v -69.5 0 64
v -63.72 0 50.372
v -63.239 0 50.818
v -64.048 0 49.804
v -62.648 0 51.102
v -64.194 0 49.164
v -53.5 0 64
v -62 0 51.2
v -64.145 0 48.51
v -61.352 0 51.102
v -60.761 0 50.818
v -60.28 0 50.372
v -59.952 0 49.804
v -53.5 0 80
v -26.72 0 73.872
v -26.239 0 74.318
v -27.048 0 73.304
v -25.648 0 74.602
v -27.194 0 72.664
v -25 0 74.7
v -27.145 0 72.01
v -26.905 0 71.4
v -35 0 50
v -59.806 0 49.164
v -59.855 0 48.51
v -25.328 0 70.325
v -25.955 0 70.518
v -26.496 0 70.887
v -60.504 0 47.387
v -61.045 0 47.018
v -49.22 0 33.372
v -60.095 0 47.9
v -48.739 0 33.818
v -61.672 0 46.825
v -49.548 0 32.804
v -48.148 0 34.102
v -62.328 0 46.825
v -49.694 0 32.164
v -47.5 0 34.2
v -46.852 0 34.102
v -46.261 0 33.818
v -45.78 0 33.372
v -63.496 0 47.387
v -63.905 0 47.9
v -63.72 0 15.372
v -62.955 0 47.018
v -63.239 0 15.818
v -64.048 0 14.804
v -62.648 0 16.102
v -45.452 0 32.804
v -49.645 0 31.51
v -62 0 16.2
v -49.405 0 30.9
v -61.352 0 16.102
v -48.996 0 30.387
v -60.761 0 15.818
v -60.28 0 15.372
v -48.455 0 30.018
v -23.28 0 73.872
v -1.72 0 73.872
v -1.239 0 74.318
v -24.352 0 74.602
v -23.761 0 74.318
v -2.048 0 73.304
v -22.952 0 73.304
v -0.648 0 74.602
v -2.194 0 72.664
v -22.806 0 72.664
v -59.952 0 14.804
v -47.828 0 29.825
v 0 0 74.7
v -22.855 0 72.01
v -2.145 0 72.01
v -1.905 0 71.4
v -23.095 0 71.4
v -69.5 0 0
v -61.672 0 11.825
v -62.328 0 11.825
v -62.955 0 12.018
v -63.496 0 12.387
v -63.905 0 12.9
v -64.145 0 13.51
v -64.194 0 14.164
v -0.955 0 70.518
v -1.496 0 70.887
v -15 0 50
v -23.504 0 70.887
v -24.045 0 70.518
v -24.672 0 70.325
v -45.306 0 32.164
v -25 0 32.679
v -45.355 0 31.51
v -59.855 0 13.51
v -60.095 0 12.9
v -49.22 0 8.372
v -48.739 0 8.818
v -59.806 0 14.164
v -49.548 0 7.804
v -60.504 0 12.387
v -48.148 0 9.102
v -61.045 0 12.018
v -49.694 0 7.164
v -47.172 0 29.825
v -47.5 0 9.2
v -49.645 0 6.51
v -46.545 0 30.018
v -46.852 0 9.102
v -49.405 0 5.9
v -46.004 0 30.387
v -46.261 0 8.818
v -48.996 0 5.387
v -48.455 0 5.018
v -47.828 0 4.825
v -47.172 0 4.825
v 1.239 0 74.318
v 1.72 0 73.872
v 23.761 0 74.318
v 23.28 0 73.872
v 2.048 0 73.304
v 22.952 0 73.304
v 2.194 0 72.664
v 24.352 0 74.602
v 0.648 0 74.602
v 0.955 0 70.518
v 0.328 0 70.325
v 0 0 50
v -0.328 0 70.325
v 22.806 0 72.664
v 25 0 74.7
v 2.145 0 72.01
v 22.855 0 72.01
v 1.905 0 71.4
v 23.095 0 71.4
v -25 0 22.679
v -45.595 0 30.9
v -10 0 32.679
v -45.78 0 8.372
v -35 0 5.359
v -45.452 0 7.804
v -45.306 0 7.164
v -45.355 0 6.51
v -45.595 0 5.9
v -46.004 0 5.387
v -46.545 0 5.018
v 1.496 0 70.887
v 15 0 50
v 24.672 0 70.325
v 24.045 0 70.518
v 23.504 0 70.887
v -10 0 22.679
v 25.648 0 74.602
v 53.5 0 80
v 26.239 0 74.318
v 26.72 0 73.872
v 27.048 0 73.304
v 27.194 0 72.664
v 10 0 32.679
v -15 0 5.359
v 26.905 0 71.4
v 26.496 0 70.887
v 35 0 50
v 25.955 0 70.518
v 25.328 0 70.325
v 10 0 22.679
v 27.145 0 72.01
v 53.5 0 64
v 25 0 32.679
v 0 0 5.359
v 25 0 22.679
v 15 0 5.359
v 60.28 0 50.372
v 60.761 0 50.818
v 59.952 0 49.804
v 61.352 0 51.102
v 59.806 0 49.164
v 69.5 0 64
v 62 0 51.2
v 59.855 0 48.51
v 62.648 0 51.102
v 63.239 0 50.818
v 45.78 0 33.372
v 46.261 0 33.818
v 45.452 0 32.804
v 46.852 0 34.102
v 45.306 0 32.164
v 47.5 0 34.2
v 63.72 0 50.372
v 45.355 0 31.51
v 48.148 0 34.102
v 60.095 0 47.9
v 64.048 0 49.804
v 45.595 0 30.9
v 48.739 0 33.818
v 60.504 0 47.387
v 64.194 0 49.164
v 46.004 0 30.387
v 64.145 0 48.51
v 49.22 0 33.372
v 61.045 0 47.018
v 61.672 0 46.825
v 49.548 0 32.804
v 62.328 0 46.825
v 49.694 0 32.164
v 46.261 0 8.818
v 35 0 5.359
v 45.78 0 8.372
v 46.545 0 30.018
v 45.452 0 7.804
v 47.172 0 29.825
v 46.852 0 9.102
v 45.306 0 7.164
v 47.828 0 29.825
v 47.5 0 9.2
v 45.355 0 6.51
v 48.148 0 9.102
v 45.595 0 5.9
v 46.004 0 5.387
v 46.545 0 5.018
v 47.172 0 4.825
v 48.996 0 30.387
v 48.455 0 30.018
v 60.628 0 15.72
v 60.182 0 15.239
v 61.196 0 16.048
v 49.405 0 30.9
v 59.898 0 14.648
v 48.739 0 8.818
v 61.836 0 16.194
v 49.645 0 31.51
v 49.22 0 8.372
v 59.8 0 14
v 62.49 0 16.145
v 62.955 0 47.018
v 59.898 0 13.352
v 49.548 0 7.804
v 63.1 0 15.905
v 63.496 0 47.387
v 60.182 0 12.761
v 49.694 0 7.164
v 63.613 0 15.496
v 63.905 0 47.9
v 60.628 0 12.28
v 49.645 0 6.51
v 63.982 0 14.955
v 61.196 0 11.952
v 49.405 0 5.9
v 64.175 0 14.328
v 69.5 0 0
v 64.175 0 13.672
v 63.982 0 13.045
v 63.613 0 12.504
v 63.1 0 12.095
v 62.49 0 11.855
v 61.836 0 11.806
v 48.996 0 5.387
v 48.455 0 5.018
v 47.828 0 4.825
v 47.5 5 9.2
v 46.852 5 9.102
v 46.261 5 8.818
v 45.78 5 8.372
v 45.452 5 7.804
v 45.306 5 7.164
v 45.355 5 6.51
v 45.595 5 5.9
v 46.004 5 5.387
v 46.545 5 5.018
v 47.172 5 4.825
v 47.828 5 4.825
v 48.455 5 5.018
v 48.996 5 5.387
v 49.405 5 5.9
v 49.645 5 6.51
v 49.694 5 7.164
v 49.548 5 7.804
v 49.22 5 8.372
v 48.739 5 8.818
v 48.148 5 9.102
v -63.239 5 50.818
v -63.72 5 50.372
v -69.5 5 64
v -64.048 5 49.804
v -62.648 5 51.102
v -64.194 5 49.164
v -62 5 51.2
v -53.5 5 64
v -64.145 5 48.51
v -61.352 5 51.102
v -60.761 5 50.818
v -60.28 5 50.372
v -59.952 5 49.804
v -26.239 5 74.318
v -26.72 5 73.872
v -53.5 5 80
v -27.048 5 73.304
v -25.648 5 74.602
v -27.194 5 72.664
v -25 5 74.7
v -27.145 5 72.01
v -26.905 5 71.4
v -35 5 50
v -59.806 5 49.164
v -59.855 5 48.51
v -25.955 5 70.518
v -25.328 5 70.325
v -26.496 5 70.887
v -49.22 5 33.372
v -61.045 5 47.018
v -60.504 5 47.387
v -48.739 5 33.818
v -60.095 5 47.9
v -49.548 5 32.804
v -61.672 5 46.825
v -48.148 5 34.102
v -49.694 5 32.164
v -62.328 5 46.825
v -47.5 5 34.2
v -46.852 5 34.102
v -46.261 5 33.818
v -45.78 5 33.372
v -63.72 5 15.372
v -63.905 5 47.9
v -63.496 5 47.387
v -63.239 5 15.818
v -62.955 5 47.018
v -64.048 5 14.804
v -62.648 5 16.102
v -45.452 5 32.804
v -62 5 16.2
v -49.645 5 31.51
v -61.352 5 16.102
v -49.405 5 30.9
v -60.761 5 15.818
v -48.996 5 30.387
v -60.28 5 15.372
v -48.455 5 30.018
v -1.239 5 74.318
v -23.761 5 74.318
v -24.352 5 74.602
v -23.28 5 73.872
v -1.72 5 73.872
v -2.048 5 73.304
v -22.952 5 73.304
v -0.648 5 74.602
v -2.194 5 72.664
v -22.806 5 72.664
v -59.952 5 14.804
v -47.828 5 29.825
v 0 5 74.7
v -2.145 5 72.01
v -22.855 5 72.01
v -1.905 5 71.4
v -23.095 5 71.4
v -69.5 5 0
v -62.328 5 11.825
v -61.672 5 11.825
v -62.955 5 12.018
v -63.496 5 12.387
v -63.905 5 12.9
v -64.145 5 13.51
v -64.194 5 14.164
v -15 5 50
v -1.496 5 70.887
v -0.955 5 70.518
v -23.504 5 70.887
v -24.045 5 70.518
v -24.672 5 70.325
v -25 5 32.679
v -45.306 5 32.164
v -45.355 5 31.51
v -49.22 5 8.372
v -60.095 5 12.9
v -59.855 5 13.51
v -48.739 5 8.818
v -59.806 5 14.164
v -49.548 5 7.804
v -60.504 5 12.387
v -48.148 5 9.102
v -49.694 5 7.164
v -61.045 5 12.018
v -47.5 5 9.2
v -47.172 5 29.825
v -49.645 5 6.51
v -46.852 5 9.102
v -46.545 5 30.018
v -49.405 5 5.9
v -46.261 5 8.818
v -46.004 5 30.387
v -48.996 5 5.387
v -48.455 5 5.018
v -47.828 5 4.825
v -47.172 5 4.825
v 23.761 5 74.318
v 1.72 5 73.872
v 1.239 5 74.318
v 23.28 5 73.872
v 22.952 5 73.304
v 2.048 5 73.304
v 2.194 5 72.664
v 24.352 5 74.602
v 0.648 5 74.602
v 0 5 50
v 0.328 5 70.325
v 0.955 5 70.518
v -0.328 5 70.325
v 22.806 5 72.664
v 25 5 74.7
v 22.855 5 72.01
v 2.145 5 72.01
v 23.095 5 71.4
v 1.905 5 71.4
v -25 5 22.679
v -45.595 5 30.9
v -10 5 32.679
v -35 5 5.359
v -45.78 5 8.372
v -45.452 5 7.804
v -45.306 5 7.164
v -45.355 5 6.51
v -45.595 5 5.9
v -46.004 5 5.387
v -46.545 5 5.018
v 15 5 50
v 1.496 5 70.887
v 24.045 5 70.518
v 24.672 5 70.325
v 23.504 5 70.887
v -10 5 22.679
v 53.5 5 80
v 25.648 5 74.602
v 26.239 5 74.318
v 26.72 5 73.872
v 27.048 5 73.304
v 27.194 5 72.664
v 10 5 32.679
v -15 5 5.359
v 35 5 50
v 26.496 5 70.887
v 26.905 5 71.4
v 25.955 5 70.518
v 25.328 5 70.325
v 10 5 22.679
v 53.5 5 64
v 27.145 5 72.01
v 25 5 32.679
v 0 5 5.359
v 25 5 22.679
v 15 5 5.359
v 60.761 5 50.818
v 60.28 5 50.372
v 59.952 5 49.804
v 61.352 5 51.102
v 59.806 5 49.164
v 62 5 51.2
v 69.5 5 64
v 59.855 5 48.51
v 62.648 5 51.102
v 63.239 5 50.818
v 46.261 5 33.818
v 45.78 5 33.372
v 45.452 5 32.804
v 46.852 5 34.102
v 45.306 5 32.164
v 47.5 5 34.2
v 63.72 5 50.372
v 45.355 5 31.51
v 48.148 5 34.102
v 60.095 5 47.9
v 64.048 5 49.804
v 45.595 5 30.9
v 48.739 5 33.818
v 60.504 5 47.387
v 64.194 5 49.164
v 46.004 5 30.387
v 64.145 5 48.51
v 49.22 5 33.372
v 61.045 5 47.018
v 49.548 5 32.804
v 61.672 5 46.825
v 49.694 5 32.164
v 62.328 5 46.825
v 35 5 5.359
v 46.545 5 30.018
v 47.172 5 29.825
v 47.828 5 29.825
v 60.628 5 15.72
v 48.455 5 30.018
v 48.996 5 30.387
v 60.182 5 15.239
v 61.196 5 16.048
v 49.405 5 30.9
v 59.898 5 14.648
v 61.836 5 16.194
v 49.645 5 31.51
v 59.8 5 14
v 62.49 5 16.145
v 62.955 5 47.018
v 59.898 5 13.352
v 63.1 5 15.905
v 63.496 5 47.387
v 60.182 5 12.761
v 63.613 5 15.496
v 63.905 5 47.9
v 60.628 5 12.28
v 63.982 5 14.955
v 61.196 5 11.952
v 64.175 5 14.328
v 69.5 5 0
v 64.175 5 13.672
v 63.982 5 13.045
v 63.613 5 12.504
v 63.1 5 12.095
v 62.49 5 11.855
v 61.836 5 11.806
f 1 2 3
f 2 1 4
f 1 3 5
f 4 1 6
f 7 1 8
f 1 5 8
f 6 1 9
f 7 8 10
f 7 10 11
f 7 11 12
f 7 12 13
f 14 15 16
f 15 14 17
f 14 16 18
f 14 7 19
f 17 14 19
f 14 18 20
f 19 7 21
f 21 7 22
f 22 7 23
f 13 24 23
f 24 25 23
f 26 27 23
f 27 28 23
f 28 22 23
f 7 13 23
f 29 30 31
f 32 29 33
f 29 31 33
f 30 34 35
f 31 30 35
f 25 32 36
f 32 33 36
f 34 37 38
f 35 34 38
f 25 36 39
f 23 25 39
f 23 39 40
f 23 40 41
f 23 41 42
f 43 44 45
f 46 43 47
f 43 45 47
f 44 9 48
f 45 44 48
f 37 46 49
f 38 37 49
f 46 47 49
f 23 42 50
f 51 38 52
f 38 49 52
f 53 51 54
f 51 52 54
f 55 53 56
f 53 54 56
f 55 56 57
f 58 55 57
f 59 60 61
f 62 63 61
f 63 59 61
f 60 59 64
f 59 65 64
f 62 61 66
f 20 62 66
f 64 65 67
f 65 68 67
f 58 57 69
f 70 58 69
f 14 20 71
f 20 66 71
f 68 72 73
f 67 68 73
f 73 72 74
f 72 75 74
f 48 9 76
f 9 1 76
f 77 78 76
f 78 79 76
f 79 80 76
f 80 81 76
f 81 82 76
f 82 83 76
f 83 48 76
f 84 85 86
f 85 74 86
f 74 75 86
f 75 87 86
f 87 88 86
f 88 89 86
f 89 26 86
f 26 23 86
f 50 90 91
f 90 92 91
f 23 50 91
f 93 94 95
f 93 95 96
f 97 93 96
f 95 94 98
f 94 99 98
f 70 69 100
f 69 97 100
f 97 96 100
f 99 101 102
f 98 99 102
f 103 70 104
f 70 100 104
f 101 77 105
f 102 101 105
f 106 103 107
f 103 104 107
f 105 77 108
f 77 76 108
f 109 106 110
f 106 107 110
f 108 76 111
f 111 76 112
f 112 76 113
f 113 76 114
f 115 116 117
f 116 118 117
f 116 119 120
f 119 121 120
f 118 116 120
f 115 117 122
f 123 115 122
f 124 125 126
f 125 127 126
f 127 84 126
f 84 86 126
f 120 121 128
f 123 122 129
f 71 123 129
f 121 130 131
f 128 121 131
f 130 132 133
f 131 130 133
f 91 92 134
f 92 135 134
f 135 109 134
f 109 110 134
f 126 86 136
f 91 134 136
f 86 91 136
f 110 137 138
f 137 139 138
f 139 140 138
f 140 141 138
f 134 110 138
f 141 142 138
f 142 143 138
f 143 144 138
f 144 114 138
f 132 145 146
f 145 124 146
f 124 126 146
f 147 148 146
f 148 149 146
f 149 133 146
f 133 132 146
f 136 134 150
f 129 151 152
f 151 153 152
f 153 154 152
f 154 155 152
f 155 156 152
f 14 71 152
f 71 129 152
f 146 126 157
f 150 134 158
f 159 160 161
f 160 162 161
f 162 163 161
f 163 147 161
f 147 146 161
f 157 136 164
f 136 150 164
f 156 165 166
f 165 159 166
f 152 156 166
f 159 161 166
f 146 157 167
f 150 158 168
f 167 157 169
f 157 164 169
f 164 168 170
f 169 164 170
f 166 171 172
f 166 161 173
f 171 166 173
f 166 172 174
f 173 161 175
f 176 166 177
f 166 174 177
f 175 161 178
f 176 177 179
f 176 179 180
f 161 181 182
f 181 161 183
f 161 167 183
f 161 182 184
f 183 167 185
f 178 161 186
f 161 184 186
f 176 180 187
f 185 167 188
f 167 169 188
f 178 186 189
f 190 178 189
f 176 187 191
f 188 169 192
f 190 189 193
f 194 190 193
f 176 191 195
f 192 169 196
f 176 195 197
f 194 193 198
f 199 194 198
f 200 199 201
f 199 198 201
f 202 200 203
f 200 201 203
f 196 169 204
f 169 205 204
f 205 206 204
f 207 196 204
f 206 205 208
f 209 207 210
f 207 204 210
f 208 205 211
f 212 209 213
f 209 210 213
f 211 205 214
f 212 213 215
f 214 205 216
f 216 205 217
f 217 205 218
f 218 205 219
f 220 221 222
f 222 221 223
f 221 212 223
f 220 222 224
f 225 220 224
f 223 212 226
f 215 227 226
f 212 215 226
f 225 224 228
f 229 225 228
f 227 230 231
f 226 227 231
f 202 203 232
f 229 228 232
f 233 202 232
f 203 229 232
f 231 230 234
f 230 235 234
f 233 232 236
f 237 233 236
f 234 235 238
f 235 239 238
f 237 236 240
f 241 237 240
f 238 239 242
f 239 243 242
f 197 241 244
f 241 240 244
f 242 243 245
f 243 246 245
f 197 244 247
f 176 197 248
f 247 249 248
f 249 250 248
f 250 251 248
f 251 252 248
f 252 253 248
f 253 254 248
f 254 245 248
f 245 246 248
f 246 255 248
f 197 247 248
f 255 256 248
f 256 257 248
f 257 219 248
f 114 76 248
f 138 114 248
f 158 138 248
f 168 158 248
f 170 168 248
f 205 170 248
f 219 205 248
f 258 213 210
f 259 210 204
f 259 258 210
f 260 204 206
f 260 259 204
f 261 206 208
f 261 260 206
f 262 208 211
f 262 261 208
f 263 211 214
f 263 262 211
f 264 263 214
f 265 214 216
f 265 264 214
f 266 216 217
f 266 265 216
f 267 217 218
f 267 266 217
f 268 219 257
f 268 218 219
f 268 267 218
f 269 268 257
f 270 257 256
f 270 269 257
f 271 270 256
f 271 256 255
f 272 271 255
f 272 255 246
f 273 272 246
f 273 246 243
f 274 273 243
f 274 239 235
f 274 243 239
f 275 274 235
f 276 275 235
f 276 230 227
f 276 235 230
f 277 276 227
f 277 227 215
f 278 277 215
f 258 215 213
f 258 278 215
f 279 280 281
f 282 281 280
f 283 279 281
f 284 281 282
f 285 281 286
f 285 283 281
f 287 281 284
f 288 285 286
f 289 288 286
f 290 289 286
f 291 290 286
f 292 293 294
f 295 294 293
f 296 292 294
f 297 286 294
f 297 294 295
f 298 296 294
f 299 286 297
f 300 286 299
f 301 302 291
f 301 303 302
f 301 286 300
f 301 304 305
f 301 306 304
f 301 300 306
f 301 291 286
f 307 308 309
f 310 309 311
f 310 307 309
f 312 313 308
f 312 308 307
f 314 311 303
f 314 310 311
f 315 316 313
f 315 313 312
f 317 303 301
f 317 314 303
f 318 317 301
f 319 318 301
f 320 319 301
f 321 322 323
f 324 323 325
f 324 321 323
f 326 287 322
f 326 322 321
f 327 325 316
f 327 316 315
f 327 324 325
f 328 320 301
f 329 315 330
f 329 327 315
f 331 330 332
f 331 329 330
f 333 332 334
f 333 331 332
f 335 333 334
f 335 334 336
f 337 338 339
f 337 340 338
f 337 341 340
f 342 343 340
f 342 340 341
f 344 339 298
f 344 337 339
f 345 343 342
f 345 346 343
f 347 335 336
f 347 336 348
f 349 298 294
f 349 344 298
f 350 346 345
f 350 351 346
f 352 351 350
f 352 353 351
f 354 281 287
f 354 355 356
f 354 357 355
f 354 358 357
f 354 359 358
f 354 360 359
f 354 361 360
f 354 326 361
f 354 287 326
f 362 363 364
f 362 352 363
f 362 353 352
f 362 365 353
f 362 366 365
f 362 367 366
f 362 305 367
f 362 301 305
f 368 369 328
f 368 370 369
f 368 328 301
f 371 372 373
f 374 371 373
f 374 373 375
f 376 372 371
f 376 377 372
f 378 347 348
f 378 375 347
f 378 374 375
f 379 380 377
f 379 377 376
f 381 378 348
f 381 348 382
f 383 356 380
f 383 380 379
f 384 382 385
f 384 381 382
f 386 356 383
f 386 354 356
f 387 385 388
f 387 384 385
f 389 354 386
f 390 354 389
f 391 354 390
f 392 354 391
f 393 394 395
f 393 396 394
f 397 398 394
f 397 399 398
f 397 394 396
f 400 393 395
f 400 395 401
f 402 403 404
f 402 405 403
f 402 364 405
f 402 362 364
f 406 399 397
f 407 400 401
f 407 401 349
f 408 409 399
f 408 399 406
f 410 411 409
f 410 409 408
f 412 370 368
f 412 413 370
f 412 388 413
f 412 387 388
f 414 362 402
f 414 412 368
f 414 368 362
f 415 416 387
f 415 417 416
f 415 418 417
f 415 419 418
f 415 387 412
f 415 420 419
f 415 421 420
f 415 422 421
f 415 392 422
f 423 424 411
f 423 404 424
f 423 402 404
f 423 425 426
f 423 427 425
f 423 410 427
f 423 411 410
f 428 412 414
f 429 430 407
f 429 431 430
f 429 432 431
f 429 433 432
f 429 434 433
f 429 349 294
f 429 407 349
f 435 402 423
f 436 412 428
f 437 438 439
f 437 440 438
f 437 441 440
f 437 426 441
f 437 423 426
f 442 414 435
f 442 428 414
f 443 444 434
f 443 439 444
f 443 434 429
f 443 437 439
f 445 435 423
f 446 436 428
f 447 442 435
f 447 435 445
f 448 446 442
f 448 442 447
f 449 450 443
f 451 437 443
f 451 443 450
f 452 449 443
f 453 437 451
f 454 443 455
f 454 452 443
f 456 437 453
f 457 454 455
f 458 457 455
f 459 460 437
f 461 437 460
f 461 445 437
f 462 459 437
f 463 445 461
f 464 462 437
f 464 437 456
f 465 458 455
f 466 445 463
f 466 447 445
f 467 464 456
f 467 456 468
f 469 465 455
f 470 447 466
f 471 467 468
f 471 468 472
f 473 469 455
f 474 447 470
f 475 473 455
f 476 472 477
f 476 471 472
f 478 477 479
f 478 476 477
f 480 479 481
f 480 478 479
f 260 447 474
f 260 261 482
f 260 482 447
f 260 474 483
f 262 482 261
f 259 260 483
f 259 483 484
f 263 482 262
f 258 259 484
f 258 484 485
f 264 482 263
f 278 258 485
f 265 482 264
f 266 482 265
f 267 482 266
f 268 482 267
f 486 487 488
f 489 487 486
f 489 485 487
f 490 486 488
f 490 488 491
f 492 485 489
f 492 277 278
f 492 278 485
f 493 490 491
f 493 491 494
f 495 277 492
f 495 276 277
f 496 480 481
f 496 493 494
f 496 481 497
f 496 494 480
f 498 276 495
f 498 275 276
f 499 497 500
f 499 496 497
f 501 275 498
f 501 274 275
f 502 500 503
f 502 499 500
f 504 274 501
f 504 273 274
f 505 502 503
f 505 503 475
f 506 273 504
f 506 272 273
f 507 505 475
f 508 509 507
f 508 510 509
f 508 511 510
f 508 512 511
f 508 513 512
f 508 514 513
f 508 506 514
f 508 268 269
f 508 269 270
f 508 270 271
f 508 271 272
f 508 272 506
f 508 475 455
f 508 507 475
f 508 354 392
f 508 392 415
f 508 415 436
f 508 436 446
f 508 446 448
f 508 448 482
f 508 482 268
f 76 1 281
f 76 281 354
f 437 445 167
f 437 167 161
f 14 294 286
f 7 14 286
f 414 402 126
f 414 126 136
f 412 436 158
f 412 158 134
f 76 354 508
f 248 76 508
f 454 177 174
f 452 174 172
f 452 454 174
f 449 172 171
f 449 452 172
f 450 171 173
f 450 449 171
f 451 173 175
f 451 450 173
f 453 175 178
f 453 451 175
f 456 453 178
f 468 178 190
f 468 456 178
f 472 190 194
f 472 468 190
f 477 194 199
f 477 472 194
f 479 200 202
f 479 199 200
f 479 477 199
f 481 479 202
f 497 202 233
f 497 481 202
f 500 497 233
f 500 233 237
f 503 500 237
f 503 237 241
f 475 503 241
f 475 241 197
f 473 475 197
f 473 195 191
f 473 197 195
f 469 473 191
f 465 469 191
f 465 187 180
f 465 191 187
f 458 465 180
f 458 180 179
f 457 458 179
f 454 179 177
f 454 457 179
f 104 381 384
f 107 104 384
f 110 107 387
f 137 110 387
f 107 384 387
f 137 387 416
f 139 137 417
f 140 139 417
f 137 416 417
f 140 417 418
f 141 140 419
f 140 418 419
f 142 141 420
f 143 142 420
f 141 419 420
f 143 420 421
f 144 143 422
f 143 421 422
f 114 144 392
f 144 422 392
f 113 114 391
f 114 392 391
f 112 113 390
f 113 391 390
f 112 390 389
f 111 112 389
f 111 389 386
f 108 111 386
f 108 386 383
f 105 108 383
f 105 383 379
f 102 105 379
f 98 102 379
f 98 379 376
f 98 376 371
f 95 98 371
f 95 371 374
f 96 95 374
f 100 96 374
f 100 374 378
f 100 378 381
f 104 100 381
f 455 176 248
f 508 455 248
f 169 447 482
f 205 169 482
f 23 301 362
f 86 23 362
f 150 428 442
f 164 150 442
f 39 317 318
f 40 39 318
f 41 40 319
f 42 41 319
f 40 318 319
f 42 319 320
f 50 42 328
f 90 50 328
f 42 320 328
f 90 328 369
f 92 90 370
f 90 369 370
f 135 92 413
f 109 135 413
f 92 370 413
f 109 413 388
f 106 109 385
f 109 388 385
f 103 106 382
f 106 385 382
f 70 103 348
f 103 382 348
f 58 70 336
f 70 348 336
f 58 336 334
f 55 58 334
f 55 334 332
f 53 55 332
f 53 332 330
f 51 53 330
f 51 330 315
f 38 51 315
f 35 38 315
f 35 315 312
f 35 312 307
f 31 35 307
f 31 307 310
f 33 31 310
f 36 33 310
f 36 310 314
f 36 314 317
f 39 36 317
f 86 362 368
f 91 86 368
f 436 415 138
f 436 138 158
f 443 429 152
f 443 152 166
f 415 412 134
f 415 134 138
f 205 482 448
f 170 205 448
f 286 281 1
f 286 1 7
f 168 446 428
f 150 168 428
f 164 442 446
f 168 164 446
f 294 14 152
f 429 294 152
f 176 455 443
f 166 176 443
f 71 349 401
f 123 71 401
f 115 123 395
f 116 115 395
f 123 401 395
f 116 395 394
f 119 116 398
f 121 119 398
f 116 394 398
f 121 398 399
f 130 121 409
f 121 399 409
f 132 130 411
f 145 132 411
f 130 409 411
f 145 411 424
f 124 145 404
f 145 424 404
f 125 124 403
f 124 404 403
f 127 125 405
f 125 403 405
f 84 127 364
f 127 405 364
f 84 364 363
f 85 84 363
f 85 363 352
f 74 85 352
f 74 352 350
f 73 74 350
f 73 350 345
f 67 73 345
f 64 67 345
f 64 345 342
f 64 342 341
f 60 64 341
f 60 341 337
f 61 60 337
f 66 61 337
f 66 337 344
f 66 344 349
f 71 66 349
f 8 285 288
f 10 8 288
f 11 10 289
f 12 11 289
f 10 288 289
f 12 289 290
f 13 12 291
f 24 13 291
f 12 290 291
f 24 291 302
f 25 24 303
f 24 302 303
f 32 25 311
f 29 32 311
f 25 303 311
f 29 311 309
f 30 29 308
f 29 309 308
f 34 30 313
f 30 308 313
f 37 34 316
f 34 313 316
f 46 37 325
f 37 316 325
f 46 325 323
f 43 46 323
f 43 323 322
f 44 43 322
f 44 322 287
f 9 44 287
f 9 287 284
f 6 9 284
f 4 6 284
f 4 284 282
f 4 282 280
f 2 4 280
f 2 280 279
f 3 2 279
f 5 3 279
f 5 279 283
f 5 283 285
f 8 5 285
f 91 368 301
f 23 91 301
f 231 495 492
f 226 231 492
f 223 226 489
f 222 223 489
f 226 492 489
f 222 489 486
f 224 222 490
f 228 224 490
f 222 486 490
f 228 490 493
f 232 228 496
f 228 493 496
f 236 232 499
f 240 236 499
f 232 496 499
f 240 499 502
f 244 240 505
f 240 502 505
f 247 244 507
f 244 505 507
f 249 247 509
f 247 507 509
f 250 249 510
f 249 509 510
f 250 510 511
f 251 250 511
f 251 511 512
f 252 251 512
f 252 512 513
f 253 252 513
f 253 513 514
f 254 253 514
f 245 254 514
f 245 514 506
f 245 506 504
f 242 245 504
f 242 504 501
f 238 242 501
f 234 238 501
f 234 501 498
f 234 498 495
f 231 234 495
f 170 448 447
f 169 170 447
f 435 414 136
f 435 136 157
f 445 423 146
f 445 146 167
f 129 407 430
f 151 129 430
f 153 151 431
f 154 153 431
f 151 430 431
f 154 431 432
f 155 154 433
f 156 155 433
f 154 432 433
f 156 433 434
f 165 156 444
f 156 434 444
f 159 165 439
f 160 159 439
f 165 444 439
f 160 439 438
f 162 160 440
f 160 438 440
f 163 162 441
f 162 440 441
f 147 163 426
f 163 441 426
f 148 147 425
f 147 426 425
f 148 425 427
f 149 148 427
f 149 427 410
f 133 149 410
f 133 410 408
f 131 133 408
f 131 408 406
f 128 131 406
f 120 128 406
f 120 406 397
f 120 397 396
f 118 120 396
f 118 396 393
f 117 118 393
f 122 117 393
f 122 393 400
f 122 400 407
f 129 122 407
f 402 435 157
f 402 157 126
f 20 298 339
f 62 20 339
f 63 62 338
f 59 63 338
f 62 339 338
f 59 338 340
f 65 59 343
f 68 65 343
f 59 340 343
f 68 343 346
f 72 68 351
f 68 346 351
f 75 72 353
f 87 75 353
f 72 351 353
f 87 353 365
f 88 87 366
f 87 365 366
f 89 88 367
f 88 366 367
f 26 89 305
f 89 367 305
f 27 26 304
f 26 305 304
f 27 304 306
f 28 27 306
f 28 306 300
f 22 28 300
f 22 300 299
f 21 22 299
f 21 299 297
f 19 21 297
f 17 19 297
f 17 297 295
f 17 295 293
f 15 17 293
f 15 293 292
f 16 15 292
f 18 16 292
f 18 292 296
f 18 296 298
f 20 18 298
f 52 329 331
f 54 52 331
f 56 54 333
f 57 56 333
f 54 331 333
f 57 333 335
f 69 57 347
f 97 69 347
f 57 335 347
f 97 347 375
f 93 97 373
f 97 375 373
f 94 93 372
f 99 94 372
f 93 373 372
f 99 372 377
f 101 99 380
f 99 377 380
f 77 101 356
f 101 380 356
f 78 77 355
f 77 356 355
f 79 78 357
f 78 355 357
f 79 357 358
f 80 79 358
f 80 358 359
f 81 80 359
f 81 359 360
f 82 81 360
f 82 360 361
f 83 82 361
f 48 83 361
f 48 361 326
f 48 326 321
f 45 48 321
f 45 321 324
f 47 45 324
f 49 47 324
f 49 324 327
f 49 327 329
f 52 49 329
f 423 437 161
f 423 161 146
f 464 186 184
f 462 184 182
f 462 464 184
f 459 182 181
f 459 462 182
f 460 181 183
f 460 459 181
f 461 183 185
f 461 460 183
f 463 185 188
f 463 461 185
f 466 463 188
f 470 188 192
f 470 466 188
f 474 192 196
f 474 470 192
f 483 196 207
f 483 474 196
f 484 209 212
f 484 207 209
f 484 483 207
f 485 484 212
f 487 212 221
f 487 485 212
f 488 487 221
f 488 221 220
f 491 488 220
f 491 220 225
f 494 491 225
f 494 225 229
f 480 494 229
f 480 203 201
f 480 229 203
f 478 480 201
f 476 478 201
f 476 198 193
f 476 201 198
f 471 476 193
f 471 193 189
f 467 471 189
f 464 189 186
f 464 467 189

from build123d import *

# Parameters (mm, degrees)
SKETCH1_W               = 139
SKETCH1_H               = 160
BOSS_EXTRUDE1_DEPTH     = 5
SKETCH2_W               = 16
SKETCH2_H               = 16
CUT_EXTRUDE1_DEPTH      = 107.090763029
SKETCH3_R               = 2.2
CUT_EXTRUDE2_DEPTH      = 107.090763029
SKETCH4_R               = 2.2
CUT_EXTRUDE3_DEPTH      = 107.090763029
LPATTERN1_COUNT         = 4
LPATTERN1_PITCH         = 35
MIRROR2_COPY_1_SKETCH_R = 2.2
MIRROR2_COPY_1_DEPTH    = 107.090763029
MIRROR2_COPY_2_SKETCH_R = 2.2
MIRROR2_COPY_2_DEPTH    = 107.090763029
MIRROR2_COPY_3_SKETCH_R = 2.2
MIRROR2_COPY_3_DEPTH    = 107.090763029
SKETCH5_R               = 2.2
CUT_EXTRUDE4_DEPTH      = 107.090763029
CUT_EXTRUDE5_DEPTH      = 107.090763029
SKETCH9_W               = 139
SKETCH9_H               = 80
CUT_EXTRUDE6_DEPTH      = 10


with BuildPart() as part:
    # Sketch1 → Boss-Extrude1 (new body)
    with BuildSketch(Plane(origin=(0, 0, 0), x_dir=(1, 0, 0), z_dir=(0, 1, 0))):
        Rectangle(SKETCH1_W, SKETCH1_H)
    extrude(amount=BOSS_EXTRUDE1_DEPTH)

    # Sketch2 → Cut-Extrude1 (cut, through all)
    with BuildSketch(Plane(origin=(0, 5, 0), x_dir=(1, 0, 0), z_dir=(0, 1, 0))):
        with Locations((-61.5, -72)):
            Rectangle(SKETCH2_W, SKETCH2_H)
    cut_extrude1 = extrude(amount=-CUT_EXTRUDE1_DEPTH, mode=Mode.SUBTRACT)

    # Mirror1: Cut-Extrude1 across plane
    add(cut_extrude1.mirror(Plane(origin=(0, 0, 0), x_dir=(0, 0, 1), z_dir=(1, 0, 0))), mode=Mode.SUBTRACT)

    # Sketch3 → Cut-Extrude2 (cut, through all)
    with BuildSketch(Plane(origin=(0, 5, 0), x_dir=(1, 0, 0), z_dir=(0, 1, 0))):
        with Locations(Location((0, -72.5, 0), (0, 0, 270))):
            Circle(SKETCH3_R)
        with Locations(Location((-25, -72.5, 0), (0, 0, 270))):
            Circle(SKETCH3_R)
        with Locations(Location((25, -72.5, 0), (0, 0, 270))):
            Circle(SKETCH3_R)
    extrude(amount=-CUT_EXTRUDE2_DEPTH, mode=Mode.SUBTRACT)

    # Sketch4 → Cut-Extrude3 (cut, through all)
    with BuildSketch(Plane(origin=(0, 5, 0), x_dir=(1, 0, 0), z_dir=(0, 1, 0))):
        with Locations(Location((-62, -49, 0), (0, 0, 270))):
            Circle(SKETCH4_R)
    cut_extrude3 = extrude(amount=-CUT_EXTRUDE3_DEPTH, mode=Mode.SUBTRACT)

    # LPattern1: Cut-Extrude3 ×4
    with Locations(*[(0, 0, -i * LPATTERN1_PITCH) for i in range(1, LPATTERN1_COUNT)]):
        add(cut_extrude3, mode=Mode.SUBTRACT)

    # Mirror2: Cut-Extrude3 across plane
    add(cut_extrude3.mirror(Plane(origin=(0, 0, 0), x_dir=(0, 0, 1), z_dir=(1, 0, 0))), mode=Mode.SUBTRACT)

    # Mirror2 copy 1 sketch → Mirror2 copy 1 (cut, through all)
    with BuildSketch(Plane(origin=(0, 5, -35), x_dir=(-1, 0, 0), z_dir=(0, 1, 0))):
        with Locations((-62, 49)):
            Circle(MIRROR2_COPY_1_SKETCH_R)
    extrude(amount=-MIRROR2_COPY_1_DEPTH, mode=Mode.SUBTRACT)

    # Mirror2 copy 2 sketch → Mirror2 copy 2 (cut, through all)
    with BuildSketch(Plane(origin=(0, 5, -70), x_dir=(-1, 0, 0), z_dir=(0, 1, 0))):
        with Locations((-62, 49)):
            Circle(MIRROR2_COPY_2_SKETCH_R)
    extrude(amount=-MIRROR2_COPY_2_DEPTH, mode=Mode.SUBTRACT)

    # Mirror2 copy 3 sketch → Mirror2 copy 3 (cut, through all)
    with BuildSketch(Plane(origin=(0, 5, -105), x_dir=(-1, 0, 0), z_dir=(0, 1, 0))):
        with Locations((-62, 49)):
            Circle(MIRROR2_COPY_3_SKETCH_R)
    extrude(amount=-MIRROR2_COPY_3_DEPTH, mode=Mode.SUBTRACT)

    # Sketch5 → Cut-Extrude4 (cut, through all)
    with BuildSketch(Plane(origin=(0, 5, 0), x_dir=(1, 0, 0), z_dir=(0, 1, 0))):
        with Locations(Location((-47.5, -32, 0), (0, 0, 270))):
            Circle(SKETCH5_R)
        with Locations(Location((-47.5, -7, 0), (0, 0, 270))):
            Circle(SKETCH5_R)
    cut_extrude4 = extrude(amount=-CUT_EXTRUDE4_DEPTH, mode=Mode.SUBTRACT)

    # Mirror3: Cut-Extrude4 across plane
    add(cut_extrude4.mirror(Plane(origin=(0, 0, 0), x_dir=(0, 0, 1), z_dir=(1, 0, 0))), mode=Mode.SUBTRACT)

    # Sketch6 → Cut-Extrude5 (cut, through all)
    with BuildSketch(Plane(origin=(0, 5, 0), x_dir=(1, 0, 0), z_dir=(0, 1, 0))):
        Polygon((0, 50), (-10, 32.679491924), (10, 32.679491924), align=None)
        Polygon((15, 50), (25, 32.679491924), (35, 50), align=None)
        Polygon((-25, 32.679491924), (-35, 50), (-15, 50), align=None)
        Polygon((25, 22.679491924), (35, 5.358983849), (15, 5.358983849), align=None)
        Polygon((-10, 22.679491924), (10, 22.679491924), (0, 5.358983849), align=None)
        Polygon((-15, 5.358983849), (-25, 22.679491924), (-35, 5.358983849), align=None)
        Polygon((15, -5.358983849), (25, -22.679491924), (35, -5.358983849), align=None)
        Polygon((0, -5.358983849), (-10, -22.679491924), (10, -22.679491924), align=None)
        Polygon((-35, -5.358983849), (-15, -5.358983849), (-25, -22.679491924), align=None)
        Polygon((25, -32.679491924), (35, -50), (15, -50), align=None)
        Polygon((-10, -32.679491924), (10, -32.679491924), (0, -50), align=None)
        Polygon((-15, -50), (-25, -32.679491924), (-35, -50), align=None)
    extrude(amount=-CUT_EXTRUDE5_DEPTH, mode=Mode.SUBTRACT)

    # Sketch9 → Cut-Extrude6 (cut)
    with BuildSketch(Plane(origin=(0, 5, 0), x_dir=(1, 0, 0), z_dir=(0, 1, 0))):
        with Locations((0, 40)):
            Rectangle(SKETCH9_W, SKETCH9_H)
    extrude(amount=-CUT_EXTRUDE6_DEPTH, mode=Mode.SUBTRACT)


solid = part.part
